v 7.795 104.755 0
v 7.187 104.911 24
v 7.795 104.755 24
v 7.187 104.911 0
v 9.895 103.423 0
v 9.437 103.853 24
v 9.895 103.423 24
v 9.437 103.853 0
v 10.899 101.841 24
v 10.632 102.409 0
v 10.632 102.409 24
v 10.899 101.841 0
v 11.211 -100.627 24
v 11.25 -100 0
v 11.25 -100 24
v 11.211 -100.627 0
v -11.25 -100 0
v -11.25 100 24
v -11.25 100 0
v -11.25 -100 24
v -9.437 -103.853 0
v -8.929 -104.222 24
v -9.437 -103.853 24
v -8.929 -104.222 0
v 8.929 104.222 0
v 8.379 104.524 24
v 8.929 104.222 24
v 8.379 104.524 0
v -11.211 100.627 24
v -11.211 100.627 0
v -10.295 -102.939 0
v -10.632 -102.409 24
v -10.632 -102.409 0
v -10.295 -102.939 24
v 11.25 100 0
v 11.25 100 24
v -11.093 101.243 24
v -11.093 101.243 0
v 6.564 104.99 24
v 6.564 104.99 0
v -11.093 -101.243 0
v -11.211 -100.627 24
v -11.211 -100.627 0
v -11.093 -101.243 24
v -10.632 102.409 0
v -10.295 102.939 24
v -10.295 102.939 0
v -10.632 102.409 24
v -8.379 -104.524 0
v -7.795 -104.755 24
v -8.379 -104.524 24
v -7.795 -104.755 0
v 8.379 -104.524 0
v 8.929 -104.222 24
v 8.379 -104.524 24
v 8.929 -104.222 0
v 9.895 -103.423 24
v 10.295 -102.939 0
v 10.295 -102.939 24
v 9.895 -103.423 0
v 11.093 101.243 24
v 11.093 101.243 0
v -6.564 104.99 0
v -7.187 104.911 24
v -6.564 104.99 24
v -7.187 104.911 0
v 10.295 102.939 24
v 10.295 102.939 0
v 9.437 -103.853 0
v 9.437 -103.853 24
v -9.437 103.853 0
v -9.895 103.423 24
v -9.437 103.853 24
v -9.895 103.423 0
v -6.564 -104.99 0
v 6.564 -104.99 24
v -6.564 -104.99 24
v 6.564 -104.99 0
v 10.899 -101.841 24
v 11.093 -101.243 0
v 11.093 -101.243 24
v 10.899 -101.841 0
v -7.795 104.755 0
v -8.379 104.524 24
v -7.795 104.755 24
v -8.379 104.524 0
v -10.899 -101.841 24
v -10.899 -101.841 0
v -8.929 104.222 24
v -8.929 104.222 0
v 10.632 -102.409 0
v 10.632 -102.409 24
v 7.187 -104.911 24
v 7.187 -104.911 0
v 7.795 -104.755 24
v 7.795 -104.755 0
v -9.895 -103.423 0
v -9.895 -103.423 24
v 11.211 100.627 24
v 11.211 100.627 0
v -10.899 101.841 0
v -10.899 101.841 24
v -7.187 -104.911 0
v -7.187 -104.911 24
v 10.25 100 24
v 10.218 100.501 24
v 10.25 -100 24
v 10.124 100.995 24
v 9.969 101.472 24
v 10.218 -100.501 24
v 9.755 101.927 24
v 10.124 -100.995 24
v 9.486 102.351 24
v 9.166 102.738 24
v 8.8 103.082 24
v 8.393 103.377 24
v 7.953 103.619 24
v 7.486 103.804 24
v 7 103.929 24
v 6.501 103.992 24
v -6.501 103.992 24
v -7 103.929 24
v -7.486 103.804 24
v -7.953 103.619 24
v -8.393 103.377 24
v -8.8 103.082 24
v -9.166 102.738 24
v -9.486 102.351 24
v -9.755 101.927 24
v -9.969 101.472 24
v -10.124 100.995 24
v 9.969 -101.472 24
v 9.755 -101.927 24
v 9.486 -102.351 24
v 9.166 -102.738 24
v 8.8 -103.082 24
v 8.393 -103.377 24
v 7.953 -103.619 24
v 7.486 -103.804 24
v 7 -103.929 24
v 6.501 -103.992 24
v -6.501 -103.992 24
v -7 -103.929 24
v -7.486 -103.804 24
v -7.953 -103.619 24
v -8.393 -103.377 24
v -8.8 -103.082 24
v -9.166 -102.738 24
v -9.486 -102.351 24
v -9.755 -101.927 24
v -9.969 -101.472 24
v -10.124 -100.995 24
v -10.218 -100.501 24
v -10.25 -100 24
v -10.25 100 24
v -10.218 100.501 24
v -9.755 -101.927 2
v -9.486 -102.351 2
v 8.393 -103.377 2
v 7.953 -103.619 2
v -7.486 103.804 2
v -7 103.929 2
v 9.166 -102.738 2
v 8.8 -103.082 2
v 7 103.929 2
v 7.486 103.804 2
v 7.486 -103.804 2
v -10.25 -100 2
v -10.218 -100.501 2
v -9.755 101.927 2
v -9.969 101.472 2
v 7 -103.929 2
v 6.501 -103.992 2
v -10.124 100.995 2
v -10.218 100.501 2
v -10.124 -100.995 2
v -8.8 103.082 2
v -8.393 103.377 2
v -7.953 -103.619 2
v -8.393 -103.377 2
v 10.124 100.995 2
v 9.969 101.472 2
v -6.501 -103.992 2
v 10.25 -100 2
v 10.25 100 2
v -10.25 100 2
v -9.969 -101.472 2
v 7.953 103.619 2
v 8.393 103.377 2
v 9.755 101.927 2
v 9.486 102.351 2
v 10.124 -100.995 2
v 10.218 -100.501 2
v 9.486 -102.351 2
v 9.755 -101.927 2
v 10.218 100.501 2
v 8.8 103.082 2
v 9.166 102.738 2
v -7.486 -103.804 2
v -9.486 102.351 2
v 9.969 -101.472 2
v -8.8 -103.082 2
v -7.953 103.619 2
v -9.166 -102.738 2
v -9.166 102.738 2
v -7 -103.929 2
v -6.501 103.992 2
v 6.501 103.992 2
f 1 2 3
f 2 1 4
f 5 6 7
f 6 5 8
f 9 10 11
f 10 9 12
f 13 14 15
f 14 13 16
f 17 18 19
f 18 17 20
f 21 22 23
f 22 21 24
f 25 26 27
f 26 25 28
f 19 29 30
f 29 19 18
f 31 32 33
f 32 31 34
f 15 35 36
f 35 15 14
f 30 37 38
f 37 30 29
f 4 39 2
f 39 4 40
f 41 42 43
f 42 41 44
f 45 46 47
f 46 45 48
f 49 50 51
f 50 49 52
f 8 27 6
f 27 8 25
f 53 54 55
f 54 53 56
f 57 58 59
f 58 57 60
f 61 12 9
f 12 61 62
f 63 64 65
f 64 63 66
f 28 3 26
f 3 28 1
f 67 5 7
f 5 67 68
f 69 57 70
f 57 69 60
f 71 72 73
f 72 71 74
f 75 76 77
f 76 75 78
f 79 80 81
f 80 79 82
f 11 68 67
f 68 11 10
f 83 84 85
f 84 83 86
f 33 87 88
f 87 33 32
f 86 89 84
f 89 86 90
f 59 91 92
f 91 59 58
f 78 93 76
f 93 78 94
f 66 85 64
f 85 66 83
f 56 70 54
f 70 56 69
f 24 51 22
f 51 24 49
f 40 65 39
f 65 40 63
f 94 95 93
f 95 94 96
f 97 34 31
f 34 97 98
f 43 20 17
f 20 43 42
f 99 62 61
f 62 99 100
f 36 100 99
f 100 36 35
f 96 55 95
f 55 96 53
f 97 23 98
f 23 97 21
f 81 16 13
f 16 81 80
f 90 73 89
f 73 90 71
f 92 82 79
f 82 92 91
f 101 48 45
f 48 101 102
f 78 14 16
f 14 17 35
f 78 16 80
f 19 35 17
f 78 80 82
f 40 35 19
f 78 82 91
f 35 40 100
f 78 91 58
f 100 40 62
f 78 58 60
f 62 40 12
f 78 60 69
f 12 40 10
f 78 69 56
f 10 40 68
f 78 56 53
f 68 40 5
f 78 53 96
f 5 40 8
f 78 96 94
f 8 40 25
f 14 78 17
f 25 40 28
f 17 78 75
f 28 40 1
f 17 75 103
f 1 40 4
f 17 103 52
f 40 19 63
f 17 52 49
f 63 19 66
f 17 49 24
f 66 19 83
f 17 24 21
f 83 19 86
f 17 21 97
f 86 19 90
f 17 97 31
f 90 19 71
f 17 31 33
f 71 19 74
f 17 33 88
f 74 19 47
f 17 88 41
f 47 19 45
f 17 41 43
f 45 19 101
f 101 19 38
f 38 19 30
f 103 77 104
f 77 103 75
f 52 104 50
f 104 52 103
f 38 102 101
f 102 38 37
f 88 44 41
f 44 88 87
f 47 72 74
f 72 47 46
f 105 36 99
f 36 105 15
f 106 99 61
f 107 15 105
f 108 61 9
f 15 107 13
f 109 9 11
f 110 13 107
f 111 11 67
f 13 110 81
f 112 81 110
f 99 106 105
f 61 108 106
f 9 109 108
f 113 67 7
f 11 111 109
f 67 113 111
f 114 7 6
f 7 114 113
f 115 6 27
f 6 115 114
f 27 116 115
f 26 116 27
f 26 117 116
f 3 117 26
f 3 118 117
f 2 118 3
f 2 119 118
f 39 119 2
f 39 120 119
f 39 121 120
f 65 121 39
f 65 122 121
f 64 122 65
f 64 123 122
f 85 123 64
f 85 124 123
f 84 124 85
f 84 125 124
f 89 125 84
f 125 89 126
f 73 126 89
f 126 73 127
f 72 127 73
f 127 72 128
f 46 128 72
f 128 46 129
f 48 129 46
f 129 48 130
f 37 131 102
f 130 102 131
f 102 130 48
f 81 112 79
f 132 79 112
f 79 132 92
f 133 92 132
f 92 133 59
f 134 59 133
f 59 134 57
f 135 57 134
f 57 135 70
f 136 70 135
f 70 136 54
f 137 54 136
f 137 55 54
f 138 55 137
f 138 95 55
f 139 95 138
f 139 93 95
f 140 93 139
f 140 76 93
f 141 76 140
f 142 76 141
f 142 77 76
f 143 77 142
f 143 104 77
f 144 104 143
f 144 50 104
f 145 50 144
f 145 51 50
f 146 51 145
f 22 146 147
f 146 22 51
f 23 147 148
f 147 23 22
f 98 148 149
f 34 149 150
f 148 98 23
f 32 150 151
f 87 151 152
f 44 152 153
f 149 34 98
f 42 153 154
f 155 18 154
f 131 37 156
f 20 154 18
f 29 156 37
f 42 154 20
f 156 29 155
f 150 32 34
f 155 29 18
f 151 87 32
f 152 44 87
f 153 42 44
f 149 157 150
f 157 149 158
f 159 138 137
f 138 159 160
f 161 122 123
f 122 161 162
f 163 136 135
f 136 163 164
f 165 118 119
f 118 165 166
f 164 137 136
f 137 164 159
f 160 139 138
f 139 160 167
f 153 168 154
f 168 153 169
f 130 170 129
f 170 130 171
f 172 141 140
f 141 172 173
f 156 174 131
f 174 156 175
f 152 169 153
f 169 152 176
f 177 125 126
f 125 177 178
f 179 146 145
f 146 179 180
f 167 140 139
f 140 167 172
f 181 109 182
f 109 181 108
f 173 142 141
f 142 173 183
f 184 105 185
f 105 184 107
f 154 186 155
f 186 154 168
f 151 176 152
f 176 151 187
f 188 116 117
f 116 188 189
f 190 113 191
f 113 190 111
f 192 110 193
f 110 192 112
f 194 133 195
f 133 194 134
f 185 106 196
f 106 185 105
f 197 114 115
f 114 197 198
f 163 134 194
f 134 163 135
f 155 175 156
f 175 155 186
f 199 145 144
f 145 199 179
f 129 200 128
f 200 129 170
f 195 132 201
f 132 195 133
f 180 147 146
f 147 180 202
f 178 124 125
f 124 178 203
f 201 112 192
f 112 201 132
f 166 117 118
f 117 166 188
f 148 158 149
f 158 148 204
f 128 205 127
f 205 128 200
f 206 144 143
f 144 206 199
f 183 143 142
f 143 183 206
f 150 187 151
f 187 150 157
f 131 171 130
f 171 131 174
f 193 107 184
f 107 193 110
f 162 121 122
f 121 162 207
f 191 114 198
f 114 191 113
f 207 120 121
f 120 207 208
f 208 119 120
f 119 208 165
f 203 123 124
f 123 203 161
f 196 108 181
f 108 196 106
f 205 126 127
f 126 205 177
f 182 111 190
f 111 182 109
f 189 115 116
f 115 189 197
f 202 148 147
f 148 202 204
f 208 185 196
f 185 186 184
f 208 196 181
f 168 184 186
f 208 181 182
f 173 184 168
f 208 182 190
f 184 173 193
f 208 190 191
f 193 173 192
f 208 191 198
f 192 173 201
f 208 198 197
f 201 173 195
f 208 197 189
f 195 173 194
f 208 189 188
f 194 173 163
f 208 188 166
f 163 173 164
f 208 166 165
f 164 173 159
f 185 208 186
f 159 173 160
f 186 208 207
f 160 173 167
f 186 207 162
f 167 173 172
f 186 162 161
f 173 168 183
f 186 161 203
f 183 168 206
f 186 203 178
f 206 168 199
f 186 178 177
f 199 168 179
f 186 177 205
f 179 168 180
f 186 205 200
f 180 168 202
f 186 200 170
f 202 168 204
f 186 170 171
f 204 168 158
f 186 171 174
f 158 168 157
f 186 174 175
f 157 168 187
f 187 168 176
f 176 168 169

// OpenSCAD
$fn = 50;


difference() {
	union() {
		hull() {
			translate(v = [-6.2500000000, 100.0000000000, 0]) {
				cylinder(h = 24, r = 5);
			}
			translate(v = [6.2500000000, 100.0000000000, 0]) {
				cylinder(h = 24, r = 5);
			}
			translate(v = [-6.2500000000, -100.0000000000, 0]) {
				cylinder(h = 24, r = 5);
			}
			translate(v = [6.2500000000, -100.0000000000, 0]) {
				cylinder(h = 24, r = 5);
			}
		}
	}
	union() {
		translate(v = [0, 0, 2]) {
			hull() {
				translate(v = [-6.2500000000, 100.0000000000, 0]) {
					cylinder(h = 22, r = 4);
				}
				translate(v = [6.2500000000, 100.0000000000, 0]) {
					cylinder(h = 22, r = 4);
				}
				translate(v = [-6.2500000000, -100.0000000000, 0]) {
					cylinder(h = 22, r = 4);
				}
				translate(v = [6.2500000000, -100.0000000000, 0]) {
					cylinder(h = 22, r = 4);
				}
			}
		}
	}
}
